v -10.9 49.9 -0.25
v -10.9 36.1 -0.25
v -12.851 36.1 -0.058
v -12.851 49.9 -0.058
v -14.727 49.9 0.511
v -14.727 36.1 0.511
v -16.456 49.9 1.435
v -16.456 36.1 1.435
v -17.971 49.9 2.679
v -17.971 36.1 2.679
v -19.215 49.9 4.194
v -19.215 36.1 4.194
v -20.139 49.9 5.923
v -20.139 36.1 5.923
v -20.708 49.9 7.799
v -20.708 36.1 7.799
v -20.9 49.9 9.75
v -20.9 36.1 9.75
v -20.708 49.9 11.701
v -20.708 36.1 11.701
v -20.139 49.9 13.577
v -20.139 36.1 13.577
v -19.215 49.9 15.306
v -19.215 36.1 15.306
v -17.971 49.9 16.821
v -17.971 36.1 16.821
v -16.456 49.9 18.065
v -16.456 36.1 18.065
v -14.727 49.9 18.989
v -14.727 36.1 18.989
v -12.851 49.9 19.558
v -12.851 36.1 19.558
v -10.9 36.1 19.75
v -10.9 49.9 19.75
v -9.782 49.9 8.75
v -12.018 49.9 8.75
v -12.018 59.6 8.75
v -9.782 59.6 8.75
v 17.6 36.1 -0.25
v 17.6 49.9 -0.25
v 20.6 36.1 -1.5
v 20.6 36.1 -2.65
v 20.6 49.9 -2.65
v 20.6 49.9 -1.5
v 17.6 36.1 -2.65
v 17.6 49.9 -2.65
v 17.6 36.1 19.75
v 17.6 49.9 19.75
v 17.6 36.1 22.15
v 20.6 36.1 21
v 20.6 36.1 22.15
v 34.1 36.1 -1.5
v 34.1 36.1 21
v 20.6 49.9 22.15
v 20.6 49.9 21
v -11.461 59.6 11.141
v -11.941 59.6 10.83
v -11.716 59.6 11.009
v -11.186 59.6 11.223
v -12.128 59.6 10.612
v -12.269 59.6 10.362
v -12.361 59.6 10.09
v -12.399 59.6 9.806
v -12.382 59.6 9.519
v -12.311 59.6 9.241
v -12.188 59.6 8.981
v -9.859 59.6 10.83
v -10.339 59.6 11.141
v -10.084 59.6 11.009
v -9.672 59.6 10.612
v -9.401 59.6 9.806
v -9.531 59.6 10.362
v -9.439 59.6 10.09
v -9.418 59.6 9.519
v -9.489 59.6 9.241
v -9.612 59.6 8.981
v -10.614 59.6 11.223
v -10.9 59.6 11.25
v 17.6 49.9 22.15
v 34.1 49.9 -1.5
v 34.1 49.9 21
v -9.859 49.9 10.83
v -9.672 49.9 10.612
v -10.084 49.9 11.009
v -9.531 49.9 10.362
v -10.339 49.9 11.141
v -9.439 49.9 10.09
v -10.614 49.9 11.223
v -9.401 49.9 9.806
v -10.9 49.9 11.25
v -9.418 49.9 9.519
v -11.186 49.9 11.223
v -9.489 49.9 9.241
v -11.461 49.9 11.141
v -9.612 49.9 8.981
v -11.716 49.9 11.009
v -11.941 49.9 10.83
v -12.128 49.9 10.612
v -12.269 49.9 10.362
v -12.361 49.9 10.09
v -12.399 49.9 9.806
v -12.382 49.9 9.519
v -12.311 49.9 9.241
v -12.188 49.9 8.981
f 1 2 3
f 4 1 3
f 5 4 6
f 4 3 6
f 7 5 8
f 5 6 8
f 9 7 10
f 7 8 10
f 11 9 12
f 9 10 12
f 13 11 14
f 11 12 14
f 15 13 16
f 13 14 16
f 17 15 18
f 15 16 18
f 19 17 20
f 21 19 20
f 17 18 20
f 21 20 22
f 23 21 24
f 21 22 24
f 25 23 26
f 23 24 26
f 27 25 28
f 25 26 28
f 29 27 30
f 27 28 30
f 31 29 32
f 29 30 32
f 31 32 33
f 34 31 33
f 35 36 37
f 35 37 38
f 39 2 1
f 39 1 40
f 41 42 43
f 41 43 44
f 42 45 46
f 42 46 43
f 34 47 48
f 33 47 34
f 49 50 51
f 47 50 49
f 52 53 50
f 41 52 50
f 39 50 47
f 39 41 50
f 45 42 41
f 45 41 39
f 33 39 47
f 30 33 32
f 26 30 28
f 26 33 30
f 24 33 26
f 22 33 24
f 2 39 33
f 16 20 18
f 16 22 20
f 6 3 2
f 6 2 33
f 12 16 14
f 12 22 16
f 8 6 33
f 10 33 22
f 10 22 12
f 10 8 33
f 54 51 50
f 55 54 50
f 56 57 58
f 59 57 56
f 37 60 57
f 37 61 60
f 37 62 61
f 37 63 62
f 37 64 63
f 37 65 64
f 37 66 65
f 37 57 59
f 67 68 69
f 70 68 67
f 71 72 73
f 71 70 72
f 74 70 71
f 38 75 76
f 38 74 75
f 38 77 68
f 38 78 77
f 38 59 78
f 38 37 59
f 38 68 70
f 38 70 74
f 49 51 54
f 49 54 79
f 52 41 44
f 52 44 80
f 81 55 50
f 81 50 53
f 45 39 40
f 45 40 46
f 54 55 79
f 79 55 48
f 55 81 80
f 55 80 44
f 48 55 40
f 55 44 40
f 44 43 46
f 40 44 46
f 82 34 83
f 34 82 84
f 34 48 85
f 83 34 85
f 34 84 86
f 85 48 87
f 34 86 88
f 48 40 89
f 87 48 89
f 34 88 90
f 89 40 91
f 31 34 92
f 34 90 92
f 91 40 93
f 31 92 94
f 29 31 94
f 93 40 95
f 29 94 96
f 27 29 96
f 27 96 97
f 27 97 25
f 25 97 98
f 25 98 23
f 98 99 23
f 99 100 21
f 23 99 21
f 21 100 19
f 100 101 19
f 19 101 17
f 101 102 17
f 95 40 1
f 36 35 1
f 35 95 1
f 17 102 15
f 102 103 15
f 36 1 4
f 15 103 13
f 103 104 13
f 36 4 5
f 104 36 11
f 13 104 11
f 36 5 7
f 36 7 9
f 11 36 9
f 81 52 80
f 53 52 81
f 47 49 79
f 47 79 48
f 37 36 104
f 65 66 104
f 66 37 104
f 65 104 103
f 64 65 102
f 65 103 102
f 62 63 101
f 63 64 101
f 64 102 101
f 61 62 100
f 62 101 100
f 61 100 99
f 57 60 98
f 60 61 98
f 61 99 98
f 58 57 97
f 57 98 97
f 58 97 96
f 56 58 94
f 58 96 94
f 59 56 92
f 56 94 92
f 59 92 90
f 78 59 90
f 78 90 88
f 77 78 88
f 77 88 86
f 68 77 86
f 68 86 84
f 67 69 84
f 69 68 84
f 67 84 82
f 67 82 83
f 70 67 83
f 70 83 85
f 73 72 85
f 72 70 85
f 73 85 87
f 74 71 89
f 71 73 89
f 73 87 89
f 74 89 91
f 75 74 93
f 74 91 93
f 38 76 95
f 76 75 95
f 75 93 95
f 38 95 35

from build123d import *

# Parameters (mm, degrees)
PAD_DEPTH              = 13.8
BOX002_W               = 3
BOX002_H               = 10
BOX002_DEPTH           = 3
CYLINDER001_R          = 1.5
CYLINDER001_DEPTH      = 9.7
CYLINDER001_ROLL_ANGLE = 90
CLONE_PLACEMENT_ANGLE  = 180


with BuildPart() as motorbody:
    # Sketch → Pad (new body)
    with BuildSketch(Plane.XZ):
        with BuildLine():
            Line((-45, 21.25), (-16.5, 21.25))
            Line((-16.5, 21.25), (-16.5, 23.65))
            Line((-16.5, 23.65), (-13.5, 23.65))
            Line((-13.5, 23.65), (-13.5, 22.5))
            Line((-13.5, 22.5), (0, 22.5))
            Line((0, 22.5), (0, 0))
            Line((-13.5, 0), (0, 0))
            Line((-13.5, -1.15), (-13.5, 0))
            Line((-13.5, -1.15), (-16.5, -1.15))
            Line((-16.5, -1.15), (-16.5, 1.25))
            Line((-16.5, 1.25), (-44.999948, 1.25))
            ThreePointArc((-45, 21.25), (-54.999971, 11.249974), (-44.999948, 1.25))
        make_face()
    extrude(amount=PAD_DEPTH)


with BuildPart() as cube001:
    # Box002 → Box002 (new body)
    with BuildSketch(Plane(origin=(-46.5, -23.7, 12.25), x_dir=(1, 0, 0), z_dir=(0, 0, 1))):
        with Locations((1.5, 5)):
            Rectangle(BOX002_W, BOX002_H)
    extrude(amount=BOX002_DEPTH)


with BuildPart() as clone_of_motor:
    # Cylinder001 → Cylinder001 (new body)
    with BuildSketch(Plane.XY):
        Circle(CYLINDER001_R)
    extrude(amount=CYLINDER001_DEPTH)


with BuildPart() as clone_of_motor_1:
    # Cylinder001 roll: moved
    add(clone_of_motor.part.rotate(Axis((0, 0, 0), (1, 0, 0)), CYLINDER001_ROLL_ANGLE))


with BuildPart() as clone_of_motor_2:
    # Cylinder001 placement: moved
    add(clone_of_motor_1.part.moved(Location((-45, -13.8, 11.25))))

    # Cut: cut Cube001
    add(cube001.part, mode=Mode.SUBTRACT)

    # Fusion001: union motorBody
    add(motorbody.part)


with BuildPart() as clone_of_motor_3:
    # Fusion001 placement: moved
    add(clone_of_motor_2.part.moved(Location((34.1, -23.1, -1.5))))


with BuildPart() as clone_of_motor_4:
    # Clone placement: moved
    add(clone_of_motor_3.part.moved(Location((0, 13, 19.5))).rotate(Axis((0, 13, 19.5), (1, 0, 0)), CLONE_PLACEMENT_ANGLE))


solid = clone_of_motor_4.part
